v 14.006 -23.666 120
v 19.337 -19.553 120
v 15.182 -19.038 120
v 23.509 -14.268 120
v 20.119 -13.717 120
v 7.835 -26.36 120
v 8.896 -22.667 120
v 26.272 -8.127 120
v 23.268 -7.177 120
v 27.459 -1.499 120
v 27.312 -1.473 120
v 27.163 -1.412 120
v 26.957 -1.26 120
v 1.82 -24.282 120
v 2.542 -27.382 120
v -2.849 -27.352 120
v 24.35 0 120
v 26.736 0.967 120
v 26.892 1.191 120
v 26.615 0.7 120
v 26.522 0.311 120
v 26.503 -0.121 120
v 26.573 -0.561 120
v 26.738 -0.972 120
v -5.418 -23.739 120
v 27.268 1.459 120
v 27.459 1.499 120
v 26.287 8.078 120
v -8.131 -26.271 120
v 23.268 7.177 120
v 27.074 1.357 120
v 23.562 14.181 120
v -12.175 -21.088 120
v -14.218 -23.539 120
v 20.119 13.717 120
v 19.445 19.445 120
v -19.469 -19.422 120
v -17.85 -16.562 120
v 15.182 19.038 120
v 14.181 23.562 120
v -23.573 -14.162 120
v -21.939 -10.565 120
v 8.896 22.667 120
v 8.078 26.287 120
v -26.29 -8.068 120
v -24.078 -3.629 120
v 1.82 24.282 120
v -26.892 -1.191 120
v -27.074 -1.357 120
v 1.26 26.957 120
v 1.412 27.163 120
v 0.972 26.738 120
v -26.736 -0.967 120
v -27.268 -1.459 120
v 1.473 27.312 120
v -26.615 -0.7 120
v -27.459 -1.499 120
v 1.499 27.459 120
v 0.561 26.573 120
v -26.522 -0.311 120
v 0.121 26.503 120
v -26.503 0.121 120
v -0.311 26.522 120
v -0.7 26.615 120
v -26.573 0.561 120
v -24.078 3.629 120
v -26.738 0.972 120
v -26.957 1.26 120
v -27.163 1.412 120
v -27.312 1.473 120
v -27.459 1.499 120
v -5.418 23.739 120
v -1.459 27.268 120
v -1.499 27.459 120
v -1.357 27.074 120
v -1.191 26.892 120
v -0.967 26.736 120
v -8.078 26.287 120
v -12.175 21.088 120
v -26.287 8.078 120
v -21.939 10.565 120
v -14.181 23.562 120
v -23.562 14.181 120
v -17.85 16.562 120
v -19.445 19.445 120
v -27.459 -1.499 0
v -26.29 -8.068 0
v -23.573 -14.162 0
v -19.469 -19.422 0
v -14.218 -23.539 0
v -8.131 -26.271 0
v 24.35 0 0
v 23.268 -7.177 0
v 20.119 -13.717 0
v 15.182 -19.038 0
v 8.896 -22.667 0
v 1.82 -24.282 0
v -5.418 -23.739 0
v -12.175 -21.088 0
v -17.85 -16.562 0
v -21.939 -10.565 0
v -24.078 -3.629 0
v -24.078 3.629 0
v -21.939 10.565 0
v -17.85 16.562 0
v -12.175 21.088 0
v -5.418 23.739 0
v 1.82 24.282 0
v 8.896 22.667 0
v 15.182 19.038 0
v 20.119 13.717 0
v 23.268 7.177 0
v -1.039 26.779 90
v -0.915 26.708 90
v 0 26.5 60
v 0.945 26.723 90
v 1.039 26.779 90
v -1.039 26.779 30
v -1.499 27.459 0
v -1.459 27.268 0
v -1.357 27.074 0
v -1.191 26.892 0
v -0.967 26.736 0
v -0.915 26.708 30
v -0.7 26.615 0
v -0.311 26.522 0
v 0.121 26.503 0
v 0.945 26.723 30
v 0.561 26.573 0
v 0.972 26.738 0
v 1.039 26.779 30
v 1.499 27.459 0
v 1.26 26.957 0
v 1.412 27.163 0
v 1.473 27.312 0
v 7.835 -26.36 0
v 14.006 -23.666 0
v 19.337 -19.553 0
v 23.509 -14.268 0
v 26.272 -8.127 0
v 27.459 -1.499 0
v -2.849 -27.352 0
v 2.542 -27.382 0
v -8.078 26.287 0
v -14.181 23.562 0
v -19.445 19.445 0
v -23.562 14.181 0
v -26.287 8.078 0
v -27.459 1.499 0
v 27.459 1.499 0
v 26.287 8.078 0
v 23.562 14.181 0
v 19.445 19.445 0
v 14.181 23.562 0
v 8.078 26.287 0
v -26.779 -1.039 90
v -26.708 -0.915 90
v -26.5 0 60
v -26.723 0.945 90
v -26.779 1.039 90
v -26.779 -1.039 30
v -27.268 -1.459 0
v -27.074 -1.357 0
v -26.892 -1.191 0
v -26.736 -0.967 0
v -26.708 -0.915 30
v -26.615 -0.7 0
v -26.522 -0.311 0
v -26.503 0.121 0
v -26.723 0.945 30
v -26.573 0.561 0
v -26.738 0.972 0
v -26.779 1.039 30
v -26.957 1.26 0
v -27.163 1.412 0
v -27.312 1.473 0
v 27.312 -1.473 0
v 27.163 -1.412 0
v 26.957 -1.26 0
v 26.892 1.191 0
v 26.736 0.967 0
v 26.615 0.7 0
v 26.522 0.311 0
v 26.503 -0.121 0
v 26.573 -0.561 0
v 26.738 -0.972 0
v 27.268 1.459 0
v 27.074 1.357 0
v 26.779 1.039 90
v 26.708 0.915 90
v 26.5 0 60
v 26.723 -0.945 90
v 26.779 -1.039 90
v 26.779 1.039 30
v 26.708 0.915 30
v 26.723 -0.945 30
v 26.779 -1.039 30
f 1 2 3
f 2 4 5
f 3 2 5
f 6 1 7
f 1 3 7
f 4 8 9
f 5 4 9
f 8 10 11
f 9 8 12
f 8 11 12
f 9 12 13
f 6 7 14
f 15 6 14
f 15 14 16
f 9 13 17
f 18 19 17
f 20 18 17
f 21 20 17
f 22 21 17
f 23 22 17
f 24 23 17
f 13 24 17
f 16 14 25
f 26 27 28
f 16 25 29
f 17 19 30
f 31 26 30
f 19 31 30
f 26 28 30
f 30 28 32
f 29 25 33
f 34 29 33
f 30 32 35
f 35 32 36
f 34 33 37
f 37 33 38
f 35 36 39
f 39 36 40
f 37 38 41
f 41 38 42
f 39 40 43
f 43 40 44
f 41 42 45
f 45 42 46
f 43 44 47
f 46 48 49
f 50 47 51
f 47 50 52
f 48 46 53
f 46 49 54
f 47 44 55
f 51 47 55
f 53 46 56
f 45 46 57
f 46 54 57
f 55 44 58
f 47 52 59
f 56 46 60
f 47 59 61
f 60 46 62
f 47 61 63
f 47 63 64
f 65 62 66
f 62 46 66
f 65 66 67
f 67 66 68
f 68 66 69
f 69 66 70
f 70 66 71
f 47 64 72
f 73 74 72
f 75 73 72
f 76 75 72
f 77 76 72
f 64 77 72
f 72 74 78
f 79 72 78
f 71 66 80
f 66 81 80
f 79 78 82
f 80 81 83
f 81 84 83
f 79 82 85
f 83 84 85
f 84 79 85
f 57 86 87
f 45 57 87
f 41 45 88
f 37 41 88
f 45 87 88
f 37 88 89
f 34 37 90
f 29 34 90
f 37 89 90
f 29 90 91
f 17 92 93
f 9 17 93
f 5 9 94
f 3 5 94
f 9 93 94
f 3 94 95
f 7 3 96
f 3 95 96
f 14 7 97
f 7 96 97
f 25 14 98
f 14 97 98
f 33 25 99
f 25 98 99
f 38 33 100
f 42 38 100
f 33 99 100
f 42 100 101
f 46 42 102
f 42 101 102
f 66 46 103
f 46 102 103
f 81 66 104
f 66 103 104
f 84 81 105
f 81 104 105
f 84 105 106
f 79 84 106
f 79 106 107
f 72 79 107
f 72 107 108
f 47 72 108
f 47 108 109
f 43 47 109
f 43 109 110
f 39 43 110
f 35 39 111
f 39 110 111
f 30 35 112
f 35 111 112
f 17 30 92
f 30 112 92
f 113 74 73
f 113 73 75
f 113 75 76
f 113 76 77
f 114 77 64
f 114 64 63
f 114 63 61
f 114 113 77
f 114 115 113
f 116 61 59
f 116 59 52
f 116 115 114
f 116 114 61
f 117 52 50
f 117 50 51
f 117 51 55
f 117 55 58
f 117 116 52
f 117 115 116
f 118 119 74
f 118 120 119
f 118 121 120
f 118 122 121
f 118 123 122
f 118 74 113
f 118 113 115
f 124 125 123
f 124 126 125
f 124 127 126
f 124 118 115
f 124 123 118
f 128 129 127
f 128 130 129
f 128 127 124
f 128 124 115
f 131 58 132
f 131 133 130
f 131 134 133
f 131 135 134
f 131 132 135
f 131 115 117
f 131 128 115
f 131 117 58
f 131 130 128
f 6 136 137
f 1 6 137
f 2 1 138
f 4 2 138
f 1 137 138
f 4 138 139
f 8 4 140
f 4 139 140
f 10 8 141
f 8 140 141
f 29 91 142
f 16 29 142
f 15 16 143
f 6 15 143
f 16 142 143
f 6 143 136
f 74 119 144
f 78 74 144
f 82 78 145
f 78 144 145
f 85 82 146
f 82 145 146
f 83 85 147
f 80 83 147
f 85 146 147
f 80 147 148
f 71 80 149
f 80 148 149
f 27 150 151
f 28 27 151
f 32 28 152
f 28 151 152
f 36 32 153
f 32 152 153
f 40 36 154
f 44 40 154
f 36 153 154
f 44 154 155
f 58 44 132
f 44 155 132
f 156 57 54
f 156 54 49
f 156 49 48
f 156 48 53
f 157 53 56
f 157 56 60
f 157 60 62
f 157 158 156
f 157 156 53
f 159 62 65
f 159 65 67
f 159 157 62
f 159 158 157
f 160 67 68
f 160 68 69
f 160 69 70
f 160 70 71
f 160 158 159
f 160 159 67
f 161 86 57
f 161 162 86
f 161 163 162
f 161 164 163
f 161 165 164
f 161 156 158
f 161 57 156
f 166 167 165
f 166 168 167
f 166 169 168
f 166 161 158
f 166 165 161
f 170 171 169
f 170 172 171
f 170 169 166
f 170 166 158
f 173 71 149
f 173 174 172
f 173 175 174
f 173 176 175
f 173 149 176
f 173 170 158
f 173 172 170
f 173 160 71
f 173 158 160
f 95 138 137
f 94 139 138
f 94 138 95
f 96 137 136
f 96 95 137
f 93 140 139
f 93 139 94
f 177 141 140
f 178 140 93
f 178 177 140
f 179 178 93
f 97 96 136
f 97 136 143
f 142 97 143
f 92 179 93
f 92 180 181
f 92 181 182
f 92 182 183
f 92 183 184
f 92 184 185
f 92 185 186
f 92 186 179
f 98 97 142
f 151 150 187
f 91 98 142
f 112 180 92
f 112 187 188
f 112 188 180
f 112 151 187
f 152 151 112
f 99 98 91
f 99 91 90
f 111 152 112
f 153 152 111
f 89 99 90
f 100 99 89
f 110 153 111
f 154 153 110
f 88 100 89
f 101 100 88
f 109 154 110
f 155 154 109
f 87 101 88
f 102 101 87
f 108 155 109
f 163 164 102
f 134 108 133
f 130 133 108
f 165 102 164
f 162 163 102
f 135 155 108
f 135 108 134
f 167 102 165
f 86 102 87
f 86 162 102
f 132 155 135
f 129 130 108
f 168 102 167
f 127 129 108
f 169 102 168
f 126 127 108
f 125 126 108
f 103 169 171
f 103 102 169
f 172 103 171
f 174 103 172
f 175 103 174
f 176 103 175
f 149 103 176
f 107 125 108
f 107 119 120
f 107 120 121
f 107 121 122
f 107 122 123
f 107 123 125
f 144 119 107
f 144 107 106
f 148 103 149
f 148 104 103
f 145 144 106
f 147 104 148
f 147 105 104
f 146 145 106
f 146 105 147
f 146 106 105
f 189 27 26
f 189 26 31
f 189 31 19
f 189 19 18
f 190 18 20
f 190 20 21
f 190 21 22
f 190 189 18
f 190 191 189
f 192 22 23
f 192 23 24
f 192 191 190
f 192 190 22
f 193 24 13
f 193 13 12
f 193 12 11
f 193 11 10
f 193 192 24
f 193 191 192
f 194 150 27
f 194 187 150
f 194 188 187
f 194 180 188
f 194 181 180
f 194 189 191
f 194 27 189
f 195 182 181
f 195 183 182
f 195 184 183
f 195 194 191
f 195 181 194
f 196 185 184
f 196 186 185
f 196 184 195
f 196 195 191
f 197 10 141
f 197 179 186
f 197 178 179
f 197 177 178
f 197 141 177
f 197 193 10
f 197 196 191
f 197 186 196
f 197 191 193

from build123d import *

# Parameters (mm, degrees)
F1_DEPTH = 120


with BuildPart() as f1:
    # F0 (on Top) → F1 (new body)
    with BuildSketch(Plane.XY):
        with BuildLine():
            add(Edge.make_bspline(
                [(-26.5, 0), (-26.5, 1.4398964502), (-27.4591288738, 1.4987466396)],
                knots=[4.7123889804, 4.7123889804, 4.7123889804, 6.2423027936, 6.2423027936, 6.2423027936], degree=2, weights=[1, 0.7214122005, 1]))
            add(Edge.make_bspline(
                [(-27.4591288738, -1.4987466396), (-26.5, -1.4398964502), (-26.5, 0)],
                knots=[3.1824751672, 3.1824751672, 3.1824751672, 4.7123889804, 4.7123889804, 4.7123889804], degree=2, weights=[1, 0.7214122005, 1]))
            ThreePointArc((-27.4591288738, -1.4987466396), (-21.6810739643, -16.9168859946), (-8.1306603774, -26.2705607445))
            ThreePointArc((-8.1306603774, -26.2705607445), (-0.1544823648, -27.4995660911), (7.835, -26.360249904))
            ThreePointArc((7.835, -26.360249904), (21.5857005766, -17.0384133833), (27.4591288738, -1.4987466396))
            add(Edge.make_bspline(
                [(27.4591288738, 1.4987466396), (26.5, 1.4398964502), (26.5, 0), (26.5, -1.4398964502), (27.4591288738, -1.4987466396)],
                knots=[0.0408825136, 0.0408825136, 0.0408825136, 1.5707963268, 1.5707963268, 3.10071014, 3.10071014, 3.10071014], degree=2, weights=[1, 0.7214122005, 1, 0.7214122005, 1]))
            ThreePointArc((27.4591288738, 1.4987466396), (19.4454364826, 19.4454364826), (1.4987466396, 27.4591288738))
            add(Edge.make_bspline(
                [(-1.4987466396, 27.4591288738), (-1.4398964502, 26.5), (0, 26.5), (1.4398964502, 26.5), (1.4987466396, 27.4591288738)],
                knots=[3.1824751672, 3.1824751672, 3.1824751672, 4.7123889804, 4.7123889804, 6.2423027936, 6.2423027936, 6.2423027936], degree=2, weights=[1, 0.7214122005, 1, 0.7214122005, 1]))
            ThreePointArc((-1.4987466396, 27.4591288738), (-19.4454364826, 19.4454364826), (-27.4591288738, 1.4987466396))
        make_face()
        with BuildLine():
            ThreePointArc((-24.35, 0), (0, 24.35), (24.35, 0))
            ThreePointArc((24.35, 0), (0, -24.35), (-24.35, 0))
        make_face(mode=Mode.SUBTRACT)
    extrude(amount=F1_DEPTH)


solid = f1.part
